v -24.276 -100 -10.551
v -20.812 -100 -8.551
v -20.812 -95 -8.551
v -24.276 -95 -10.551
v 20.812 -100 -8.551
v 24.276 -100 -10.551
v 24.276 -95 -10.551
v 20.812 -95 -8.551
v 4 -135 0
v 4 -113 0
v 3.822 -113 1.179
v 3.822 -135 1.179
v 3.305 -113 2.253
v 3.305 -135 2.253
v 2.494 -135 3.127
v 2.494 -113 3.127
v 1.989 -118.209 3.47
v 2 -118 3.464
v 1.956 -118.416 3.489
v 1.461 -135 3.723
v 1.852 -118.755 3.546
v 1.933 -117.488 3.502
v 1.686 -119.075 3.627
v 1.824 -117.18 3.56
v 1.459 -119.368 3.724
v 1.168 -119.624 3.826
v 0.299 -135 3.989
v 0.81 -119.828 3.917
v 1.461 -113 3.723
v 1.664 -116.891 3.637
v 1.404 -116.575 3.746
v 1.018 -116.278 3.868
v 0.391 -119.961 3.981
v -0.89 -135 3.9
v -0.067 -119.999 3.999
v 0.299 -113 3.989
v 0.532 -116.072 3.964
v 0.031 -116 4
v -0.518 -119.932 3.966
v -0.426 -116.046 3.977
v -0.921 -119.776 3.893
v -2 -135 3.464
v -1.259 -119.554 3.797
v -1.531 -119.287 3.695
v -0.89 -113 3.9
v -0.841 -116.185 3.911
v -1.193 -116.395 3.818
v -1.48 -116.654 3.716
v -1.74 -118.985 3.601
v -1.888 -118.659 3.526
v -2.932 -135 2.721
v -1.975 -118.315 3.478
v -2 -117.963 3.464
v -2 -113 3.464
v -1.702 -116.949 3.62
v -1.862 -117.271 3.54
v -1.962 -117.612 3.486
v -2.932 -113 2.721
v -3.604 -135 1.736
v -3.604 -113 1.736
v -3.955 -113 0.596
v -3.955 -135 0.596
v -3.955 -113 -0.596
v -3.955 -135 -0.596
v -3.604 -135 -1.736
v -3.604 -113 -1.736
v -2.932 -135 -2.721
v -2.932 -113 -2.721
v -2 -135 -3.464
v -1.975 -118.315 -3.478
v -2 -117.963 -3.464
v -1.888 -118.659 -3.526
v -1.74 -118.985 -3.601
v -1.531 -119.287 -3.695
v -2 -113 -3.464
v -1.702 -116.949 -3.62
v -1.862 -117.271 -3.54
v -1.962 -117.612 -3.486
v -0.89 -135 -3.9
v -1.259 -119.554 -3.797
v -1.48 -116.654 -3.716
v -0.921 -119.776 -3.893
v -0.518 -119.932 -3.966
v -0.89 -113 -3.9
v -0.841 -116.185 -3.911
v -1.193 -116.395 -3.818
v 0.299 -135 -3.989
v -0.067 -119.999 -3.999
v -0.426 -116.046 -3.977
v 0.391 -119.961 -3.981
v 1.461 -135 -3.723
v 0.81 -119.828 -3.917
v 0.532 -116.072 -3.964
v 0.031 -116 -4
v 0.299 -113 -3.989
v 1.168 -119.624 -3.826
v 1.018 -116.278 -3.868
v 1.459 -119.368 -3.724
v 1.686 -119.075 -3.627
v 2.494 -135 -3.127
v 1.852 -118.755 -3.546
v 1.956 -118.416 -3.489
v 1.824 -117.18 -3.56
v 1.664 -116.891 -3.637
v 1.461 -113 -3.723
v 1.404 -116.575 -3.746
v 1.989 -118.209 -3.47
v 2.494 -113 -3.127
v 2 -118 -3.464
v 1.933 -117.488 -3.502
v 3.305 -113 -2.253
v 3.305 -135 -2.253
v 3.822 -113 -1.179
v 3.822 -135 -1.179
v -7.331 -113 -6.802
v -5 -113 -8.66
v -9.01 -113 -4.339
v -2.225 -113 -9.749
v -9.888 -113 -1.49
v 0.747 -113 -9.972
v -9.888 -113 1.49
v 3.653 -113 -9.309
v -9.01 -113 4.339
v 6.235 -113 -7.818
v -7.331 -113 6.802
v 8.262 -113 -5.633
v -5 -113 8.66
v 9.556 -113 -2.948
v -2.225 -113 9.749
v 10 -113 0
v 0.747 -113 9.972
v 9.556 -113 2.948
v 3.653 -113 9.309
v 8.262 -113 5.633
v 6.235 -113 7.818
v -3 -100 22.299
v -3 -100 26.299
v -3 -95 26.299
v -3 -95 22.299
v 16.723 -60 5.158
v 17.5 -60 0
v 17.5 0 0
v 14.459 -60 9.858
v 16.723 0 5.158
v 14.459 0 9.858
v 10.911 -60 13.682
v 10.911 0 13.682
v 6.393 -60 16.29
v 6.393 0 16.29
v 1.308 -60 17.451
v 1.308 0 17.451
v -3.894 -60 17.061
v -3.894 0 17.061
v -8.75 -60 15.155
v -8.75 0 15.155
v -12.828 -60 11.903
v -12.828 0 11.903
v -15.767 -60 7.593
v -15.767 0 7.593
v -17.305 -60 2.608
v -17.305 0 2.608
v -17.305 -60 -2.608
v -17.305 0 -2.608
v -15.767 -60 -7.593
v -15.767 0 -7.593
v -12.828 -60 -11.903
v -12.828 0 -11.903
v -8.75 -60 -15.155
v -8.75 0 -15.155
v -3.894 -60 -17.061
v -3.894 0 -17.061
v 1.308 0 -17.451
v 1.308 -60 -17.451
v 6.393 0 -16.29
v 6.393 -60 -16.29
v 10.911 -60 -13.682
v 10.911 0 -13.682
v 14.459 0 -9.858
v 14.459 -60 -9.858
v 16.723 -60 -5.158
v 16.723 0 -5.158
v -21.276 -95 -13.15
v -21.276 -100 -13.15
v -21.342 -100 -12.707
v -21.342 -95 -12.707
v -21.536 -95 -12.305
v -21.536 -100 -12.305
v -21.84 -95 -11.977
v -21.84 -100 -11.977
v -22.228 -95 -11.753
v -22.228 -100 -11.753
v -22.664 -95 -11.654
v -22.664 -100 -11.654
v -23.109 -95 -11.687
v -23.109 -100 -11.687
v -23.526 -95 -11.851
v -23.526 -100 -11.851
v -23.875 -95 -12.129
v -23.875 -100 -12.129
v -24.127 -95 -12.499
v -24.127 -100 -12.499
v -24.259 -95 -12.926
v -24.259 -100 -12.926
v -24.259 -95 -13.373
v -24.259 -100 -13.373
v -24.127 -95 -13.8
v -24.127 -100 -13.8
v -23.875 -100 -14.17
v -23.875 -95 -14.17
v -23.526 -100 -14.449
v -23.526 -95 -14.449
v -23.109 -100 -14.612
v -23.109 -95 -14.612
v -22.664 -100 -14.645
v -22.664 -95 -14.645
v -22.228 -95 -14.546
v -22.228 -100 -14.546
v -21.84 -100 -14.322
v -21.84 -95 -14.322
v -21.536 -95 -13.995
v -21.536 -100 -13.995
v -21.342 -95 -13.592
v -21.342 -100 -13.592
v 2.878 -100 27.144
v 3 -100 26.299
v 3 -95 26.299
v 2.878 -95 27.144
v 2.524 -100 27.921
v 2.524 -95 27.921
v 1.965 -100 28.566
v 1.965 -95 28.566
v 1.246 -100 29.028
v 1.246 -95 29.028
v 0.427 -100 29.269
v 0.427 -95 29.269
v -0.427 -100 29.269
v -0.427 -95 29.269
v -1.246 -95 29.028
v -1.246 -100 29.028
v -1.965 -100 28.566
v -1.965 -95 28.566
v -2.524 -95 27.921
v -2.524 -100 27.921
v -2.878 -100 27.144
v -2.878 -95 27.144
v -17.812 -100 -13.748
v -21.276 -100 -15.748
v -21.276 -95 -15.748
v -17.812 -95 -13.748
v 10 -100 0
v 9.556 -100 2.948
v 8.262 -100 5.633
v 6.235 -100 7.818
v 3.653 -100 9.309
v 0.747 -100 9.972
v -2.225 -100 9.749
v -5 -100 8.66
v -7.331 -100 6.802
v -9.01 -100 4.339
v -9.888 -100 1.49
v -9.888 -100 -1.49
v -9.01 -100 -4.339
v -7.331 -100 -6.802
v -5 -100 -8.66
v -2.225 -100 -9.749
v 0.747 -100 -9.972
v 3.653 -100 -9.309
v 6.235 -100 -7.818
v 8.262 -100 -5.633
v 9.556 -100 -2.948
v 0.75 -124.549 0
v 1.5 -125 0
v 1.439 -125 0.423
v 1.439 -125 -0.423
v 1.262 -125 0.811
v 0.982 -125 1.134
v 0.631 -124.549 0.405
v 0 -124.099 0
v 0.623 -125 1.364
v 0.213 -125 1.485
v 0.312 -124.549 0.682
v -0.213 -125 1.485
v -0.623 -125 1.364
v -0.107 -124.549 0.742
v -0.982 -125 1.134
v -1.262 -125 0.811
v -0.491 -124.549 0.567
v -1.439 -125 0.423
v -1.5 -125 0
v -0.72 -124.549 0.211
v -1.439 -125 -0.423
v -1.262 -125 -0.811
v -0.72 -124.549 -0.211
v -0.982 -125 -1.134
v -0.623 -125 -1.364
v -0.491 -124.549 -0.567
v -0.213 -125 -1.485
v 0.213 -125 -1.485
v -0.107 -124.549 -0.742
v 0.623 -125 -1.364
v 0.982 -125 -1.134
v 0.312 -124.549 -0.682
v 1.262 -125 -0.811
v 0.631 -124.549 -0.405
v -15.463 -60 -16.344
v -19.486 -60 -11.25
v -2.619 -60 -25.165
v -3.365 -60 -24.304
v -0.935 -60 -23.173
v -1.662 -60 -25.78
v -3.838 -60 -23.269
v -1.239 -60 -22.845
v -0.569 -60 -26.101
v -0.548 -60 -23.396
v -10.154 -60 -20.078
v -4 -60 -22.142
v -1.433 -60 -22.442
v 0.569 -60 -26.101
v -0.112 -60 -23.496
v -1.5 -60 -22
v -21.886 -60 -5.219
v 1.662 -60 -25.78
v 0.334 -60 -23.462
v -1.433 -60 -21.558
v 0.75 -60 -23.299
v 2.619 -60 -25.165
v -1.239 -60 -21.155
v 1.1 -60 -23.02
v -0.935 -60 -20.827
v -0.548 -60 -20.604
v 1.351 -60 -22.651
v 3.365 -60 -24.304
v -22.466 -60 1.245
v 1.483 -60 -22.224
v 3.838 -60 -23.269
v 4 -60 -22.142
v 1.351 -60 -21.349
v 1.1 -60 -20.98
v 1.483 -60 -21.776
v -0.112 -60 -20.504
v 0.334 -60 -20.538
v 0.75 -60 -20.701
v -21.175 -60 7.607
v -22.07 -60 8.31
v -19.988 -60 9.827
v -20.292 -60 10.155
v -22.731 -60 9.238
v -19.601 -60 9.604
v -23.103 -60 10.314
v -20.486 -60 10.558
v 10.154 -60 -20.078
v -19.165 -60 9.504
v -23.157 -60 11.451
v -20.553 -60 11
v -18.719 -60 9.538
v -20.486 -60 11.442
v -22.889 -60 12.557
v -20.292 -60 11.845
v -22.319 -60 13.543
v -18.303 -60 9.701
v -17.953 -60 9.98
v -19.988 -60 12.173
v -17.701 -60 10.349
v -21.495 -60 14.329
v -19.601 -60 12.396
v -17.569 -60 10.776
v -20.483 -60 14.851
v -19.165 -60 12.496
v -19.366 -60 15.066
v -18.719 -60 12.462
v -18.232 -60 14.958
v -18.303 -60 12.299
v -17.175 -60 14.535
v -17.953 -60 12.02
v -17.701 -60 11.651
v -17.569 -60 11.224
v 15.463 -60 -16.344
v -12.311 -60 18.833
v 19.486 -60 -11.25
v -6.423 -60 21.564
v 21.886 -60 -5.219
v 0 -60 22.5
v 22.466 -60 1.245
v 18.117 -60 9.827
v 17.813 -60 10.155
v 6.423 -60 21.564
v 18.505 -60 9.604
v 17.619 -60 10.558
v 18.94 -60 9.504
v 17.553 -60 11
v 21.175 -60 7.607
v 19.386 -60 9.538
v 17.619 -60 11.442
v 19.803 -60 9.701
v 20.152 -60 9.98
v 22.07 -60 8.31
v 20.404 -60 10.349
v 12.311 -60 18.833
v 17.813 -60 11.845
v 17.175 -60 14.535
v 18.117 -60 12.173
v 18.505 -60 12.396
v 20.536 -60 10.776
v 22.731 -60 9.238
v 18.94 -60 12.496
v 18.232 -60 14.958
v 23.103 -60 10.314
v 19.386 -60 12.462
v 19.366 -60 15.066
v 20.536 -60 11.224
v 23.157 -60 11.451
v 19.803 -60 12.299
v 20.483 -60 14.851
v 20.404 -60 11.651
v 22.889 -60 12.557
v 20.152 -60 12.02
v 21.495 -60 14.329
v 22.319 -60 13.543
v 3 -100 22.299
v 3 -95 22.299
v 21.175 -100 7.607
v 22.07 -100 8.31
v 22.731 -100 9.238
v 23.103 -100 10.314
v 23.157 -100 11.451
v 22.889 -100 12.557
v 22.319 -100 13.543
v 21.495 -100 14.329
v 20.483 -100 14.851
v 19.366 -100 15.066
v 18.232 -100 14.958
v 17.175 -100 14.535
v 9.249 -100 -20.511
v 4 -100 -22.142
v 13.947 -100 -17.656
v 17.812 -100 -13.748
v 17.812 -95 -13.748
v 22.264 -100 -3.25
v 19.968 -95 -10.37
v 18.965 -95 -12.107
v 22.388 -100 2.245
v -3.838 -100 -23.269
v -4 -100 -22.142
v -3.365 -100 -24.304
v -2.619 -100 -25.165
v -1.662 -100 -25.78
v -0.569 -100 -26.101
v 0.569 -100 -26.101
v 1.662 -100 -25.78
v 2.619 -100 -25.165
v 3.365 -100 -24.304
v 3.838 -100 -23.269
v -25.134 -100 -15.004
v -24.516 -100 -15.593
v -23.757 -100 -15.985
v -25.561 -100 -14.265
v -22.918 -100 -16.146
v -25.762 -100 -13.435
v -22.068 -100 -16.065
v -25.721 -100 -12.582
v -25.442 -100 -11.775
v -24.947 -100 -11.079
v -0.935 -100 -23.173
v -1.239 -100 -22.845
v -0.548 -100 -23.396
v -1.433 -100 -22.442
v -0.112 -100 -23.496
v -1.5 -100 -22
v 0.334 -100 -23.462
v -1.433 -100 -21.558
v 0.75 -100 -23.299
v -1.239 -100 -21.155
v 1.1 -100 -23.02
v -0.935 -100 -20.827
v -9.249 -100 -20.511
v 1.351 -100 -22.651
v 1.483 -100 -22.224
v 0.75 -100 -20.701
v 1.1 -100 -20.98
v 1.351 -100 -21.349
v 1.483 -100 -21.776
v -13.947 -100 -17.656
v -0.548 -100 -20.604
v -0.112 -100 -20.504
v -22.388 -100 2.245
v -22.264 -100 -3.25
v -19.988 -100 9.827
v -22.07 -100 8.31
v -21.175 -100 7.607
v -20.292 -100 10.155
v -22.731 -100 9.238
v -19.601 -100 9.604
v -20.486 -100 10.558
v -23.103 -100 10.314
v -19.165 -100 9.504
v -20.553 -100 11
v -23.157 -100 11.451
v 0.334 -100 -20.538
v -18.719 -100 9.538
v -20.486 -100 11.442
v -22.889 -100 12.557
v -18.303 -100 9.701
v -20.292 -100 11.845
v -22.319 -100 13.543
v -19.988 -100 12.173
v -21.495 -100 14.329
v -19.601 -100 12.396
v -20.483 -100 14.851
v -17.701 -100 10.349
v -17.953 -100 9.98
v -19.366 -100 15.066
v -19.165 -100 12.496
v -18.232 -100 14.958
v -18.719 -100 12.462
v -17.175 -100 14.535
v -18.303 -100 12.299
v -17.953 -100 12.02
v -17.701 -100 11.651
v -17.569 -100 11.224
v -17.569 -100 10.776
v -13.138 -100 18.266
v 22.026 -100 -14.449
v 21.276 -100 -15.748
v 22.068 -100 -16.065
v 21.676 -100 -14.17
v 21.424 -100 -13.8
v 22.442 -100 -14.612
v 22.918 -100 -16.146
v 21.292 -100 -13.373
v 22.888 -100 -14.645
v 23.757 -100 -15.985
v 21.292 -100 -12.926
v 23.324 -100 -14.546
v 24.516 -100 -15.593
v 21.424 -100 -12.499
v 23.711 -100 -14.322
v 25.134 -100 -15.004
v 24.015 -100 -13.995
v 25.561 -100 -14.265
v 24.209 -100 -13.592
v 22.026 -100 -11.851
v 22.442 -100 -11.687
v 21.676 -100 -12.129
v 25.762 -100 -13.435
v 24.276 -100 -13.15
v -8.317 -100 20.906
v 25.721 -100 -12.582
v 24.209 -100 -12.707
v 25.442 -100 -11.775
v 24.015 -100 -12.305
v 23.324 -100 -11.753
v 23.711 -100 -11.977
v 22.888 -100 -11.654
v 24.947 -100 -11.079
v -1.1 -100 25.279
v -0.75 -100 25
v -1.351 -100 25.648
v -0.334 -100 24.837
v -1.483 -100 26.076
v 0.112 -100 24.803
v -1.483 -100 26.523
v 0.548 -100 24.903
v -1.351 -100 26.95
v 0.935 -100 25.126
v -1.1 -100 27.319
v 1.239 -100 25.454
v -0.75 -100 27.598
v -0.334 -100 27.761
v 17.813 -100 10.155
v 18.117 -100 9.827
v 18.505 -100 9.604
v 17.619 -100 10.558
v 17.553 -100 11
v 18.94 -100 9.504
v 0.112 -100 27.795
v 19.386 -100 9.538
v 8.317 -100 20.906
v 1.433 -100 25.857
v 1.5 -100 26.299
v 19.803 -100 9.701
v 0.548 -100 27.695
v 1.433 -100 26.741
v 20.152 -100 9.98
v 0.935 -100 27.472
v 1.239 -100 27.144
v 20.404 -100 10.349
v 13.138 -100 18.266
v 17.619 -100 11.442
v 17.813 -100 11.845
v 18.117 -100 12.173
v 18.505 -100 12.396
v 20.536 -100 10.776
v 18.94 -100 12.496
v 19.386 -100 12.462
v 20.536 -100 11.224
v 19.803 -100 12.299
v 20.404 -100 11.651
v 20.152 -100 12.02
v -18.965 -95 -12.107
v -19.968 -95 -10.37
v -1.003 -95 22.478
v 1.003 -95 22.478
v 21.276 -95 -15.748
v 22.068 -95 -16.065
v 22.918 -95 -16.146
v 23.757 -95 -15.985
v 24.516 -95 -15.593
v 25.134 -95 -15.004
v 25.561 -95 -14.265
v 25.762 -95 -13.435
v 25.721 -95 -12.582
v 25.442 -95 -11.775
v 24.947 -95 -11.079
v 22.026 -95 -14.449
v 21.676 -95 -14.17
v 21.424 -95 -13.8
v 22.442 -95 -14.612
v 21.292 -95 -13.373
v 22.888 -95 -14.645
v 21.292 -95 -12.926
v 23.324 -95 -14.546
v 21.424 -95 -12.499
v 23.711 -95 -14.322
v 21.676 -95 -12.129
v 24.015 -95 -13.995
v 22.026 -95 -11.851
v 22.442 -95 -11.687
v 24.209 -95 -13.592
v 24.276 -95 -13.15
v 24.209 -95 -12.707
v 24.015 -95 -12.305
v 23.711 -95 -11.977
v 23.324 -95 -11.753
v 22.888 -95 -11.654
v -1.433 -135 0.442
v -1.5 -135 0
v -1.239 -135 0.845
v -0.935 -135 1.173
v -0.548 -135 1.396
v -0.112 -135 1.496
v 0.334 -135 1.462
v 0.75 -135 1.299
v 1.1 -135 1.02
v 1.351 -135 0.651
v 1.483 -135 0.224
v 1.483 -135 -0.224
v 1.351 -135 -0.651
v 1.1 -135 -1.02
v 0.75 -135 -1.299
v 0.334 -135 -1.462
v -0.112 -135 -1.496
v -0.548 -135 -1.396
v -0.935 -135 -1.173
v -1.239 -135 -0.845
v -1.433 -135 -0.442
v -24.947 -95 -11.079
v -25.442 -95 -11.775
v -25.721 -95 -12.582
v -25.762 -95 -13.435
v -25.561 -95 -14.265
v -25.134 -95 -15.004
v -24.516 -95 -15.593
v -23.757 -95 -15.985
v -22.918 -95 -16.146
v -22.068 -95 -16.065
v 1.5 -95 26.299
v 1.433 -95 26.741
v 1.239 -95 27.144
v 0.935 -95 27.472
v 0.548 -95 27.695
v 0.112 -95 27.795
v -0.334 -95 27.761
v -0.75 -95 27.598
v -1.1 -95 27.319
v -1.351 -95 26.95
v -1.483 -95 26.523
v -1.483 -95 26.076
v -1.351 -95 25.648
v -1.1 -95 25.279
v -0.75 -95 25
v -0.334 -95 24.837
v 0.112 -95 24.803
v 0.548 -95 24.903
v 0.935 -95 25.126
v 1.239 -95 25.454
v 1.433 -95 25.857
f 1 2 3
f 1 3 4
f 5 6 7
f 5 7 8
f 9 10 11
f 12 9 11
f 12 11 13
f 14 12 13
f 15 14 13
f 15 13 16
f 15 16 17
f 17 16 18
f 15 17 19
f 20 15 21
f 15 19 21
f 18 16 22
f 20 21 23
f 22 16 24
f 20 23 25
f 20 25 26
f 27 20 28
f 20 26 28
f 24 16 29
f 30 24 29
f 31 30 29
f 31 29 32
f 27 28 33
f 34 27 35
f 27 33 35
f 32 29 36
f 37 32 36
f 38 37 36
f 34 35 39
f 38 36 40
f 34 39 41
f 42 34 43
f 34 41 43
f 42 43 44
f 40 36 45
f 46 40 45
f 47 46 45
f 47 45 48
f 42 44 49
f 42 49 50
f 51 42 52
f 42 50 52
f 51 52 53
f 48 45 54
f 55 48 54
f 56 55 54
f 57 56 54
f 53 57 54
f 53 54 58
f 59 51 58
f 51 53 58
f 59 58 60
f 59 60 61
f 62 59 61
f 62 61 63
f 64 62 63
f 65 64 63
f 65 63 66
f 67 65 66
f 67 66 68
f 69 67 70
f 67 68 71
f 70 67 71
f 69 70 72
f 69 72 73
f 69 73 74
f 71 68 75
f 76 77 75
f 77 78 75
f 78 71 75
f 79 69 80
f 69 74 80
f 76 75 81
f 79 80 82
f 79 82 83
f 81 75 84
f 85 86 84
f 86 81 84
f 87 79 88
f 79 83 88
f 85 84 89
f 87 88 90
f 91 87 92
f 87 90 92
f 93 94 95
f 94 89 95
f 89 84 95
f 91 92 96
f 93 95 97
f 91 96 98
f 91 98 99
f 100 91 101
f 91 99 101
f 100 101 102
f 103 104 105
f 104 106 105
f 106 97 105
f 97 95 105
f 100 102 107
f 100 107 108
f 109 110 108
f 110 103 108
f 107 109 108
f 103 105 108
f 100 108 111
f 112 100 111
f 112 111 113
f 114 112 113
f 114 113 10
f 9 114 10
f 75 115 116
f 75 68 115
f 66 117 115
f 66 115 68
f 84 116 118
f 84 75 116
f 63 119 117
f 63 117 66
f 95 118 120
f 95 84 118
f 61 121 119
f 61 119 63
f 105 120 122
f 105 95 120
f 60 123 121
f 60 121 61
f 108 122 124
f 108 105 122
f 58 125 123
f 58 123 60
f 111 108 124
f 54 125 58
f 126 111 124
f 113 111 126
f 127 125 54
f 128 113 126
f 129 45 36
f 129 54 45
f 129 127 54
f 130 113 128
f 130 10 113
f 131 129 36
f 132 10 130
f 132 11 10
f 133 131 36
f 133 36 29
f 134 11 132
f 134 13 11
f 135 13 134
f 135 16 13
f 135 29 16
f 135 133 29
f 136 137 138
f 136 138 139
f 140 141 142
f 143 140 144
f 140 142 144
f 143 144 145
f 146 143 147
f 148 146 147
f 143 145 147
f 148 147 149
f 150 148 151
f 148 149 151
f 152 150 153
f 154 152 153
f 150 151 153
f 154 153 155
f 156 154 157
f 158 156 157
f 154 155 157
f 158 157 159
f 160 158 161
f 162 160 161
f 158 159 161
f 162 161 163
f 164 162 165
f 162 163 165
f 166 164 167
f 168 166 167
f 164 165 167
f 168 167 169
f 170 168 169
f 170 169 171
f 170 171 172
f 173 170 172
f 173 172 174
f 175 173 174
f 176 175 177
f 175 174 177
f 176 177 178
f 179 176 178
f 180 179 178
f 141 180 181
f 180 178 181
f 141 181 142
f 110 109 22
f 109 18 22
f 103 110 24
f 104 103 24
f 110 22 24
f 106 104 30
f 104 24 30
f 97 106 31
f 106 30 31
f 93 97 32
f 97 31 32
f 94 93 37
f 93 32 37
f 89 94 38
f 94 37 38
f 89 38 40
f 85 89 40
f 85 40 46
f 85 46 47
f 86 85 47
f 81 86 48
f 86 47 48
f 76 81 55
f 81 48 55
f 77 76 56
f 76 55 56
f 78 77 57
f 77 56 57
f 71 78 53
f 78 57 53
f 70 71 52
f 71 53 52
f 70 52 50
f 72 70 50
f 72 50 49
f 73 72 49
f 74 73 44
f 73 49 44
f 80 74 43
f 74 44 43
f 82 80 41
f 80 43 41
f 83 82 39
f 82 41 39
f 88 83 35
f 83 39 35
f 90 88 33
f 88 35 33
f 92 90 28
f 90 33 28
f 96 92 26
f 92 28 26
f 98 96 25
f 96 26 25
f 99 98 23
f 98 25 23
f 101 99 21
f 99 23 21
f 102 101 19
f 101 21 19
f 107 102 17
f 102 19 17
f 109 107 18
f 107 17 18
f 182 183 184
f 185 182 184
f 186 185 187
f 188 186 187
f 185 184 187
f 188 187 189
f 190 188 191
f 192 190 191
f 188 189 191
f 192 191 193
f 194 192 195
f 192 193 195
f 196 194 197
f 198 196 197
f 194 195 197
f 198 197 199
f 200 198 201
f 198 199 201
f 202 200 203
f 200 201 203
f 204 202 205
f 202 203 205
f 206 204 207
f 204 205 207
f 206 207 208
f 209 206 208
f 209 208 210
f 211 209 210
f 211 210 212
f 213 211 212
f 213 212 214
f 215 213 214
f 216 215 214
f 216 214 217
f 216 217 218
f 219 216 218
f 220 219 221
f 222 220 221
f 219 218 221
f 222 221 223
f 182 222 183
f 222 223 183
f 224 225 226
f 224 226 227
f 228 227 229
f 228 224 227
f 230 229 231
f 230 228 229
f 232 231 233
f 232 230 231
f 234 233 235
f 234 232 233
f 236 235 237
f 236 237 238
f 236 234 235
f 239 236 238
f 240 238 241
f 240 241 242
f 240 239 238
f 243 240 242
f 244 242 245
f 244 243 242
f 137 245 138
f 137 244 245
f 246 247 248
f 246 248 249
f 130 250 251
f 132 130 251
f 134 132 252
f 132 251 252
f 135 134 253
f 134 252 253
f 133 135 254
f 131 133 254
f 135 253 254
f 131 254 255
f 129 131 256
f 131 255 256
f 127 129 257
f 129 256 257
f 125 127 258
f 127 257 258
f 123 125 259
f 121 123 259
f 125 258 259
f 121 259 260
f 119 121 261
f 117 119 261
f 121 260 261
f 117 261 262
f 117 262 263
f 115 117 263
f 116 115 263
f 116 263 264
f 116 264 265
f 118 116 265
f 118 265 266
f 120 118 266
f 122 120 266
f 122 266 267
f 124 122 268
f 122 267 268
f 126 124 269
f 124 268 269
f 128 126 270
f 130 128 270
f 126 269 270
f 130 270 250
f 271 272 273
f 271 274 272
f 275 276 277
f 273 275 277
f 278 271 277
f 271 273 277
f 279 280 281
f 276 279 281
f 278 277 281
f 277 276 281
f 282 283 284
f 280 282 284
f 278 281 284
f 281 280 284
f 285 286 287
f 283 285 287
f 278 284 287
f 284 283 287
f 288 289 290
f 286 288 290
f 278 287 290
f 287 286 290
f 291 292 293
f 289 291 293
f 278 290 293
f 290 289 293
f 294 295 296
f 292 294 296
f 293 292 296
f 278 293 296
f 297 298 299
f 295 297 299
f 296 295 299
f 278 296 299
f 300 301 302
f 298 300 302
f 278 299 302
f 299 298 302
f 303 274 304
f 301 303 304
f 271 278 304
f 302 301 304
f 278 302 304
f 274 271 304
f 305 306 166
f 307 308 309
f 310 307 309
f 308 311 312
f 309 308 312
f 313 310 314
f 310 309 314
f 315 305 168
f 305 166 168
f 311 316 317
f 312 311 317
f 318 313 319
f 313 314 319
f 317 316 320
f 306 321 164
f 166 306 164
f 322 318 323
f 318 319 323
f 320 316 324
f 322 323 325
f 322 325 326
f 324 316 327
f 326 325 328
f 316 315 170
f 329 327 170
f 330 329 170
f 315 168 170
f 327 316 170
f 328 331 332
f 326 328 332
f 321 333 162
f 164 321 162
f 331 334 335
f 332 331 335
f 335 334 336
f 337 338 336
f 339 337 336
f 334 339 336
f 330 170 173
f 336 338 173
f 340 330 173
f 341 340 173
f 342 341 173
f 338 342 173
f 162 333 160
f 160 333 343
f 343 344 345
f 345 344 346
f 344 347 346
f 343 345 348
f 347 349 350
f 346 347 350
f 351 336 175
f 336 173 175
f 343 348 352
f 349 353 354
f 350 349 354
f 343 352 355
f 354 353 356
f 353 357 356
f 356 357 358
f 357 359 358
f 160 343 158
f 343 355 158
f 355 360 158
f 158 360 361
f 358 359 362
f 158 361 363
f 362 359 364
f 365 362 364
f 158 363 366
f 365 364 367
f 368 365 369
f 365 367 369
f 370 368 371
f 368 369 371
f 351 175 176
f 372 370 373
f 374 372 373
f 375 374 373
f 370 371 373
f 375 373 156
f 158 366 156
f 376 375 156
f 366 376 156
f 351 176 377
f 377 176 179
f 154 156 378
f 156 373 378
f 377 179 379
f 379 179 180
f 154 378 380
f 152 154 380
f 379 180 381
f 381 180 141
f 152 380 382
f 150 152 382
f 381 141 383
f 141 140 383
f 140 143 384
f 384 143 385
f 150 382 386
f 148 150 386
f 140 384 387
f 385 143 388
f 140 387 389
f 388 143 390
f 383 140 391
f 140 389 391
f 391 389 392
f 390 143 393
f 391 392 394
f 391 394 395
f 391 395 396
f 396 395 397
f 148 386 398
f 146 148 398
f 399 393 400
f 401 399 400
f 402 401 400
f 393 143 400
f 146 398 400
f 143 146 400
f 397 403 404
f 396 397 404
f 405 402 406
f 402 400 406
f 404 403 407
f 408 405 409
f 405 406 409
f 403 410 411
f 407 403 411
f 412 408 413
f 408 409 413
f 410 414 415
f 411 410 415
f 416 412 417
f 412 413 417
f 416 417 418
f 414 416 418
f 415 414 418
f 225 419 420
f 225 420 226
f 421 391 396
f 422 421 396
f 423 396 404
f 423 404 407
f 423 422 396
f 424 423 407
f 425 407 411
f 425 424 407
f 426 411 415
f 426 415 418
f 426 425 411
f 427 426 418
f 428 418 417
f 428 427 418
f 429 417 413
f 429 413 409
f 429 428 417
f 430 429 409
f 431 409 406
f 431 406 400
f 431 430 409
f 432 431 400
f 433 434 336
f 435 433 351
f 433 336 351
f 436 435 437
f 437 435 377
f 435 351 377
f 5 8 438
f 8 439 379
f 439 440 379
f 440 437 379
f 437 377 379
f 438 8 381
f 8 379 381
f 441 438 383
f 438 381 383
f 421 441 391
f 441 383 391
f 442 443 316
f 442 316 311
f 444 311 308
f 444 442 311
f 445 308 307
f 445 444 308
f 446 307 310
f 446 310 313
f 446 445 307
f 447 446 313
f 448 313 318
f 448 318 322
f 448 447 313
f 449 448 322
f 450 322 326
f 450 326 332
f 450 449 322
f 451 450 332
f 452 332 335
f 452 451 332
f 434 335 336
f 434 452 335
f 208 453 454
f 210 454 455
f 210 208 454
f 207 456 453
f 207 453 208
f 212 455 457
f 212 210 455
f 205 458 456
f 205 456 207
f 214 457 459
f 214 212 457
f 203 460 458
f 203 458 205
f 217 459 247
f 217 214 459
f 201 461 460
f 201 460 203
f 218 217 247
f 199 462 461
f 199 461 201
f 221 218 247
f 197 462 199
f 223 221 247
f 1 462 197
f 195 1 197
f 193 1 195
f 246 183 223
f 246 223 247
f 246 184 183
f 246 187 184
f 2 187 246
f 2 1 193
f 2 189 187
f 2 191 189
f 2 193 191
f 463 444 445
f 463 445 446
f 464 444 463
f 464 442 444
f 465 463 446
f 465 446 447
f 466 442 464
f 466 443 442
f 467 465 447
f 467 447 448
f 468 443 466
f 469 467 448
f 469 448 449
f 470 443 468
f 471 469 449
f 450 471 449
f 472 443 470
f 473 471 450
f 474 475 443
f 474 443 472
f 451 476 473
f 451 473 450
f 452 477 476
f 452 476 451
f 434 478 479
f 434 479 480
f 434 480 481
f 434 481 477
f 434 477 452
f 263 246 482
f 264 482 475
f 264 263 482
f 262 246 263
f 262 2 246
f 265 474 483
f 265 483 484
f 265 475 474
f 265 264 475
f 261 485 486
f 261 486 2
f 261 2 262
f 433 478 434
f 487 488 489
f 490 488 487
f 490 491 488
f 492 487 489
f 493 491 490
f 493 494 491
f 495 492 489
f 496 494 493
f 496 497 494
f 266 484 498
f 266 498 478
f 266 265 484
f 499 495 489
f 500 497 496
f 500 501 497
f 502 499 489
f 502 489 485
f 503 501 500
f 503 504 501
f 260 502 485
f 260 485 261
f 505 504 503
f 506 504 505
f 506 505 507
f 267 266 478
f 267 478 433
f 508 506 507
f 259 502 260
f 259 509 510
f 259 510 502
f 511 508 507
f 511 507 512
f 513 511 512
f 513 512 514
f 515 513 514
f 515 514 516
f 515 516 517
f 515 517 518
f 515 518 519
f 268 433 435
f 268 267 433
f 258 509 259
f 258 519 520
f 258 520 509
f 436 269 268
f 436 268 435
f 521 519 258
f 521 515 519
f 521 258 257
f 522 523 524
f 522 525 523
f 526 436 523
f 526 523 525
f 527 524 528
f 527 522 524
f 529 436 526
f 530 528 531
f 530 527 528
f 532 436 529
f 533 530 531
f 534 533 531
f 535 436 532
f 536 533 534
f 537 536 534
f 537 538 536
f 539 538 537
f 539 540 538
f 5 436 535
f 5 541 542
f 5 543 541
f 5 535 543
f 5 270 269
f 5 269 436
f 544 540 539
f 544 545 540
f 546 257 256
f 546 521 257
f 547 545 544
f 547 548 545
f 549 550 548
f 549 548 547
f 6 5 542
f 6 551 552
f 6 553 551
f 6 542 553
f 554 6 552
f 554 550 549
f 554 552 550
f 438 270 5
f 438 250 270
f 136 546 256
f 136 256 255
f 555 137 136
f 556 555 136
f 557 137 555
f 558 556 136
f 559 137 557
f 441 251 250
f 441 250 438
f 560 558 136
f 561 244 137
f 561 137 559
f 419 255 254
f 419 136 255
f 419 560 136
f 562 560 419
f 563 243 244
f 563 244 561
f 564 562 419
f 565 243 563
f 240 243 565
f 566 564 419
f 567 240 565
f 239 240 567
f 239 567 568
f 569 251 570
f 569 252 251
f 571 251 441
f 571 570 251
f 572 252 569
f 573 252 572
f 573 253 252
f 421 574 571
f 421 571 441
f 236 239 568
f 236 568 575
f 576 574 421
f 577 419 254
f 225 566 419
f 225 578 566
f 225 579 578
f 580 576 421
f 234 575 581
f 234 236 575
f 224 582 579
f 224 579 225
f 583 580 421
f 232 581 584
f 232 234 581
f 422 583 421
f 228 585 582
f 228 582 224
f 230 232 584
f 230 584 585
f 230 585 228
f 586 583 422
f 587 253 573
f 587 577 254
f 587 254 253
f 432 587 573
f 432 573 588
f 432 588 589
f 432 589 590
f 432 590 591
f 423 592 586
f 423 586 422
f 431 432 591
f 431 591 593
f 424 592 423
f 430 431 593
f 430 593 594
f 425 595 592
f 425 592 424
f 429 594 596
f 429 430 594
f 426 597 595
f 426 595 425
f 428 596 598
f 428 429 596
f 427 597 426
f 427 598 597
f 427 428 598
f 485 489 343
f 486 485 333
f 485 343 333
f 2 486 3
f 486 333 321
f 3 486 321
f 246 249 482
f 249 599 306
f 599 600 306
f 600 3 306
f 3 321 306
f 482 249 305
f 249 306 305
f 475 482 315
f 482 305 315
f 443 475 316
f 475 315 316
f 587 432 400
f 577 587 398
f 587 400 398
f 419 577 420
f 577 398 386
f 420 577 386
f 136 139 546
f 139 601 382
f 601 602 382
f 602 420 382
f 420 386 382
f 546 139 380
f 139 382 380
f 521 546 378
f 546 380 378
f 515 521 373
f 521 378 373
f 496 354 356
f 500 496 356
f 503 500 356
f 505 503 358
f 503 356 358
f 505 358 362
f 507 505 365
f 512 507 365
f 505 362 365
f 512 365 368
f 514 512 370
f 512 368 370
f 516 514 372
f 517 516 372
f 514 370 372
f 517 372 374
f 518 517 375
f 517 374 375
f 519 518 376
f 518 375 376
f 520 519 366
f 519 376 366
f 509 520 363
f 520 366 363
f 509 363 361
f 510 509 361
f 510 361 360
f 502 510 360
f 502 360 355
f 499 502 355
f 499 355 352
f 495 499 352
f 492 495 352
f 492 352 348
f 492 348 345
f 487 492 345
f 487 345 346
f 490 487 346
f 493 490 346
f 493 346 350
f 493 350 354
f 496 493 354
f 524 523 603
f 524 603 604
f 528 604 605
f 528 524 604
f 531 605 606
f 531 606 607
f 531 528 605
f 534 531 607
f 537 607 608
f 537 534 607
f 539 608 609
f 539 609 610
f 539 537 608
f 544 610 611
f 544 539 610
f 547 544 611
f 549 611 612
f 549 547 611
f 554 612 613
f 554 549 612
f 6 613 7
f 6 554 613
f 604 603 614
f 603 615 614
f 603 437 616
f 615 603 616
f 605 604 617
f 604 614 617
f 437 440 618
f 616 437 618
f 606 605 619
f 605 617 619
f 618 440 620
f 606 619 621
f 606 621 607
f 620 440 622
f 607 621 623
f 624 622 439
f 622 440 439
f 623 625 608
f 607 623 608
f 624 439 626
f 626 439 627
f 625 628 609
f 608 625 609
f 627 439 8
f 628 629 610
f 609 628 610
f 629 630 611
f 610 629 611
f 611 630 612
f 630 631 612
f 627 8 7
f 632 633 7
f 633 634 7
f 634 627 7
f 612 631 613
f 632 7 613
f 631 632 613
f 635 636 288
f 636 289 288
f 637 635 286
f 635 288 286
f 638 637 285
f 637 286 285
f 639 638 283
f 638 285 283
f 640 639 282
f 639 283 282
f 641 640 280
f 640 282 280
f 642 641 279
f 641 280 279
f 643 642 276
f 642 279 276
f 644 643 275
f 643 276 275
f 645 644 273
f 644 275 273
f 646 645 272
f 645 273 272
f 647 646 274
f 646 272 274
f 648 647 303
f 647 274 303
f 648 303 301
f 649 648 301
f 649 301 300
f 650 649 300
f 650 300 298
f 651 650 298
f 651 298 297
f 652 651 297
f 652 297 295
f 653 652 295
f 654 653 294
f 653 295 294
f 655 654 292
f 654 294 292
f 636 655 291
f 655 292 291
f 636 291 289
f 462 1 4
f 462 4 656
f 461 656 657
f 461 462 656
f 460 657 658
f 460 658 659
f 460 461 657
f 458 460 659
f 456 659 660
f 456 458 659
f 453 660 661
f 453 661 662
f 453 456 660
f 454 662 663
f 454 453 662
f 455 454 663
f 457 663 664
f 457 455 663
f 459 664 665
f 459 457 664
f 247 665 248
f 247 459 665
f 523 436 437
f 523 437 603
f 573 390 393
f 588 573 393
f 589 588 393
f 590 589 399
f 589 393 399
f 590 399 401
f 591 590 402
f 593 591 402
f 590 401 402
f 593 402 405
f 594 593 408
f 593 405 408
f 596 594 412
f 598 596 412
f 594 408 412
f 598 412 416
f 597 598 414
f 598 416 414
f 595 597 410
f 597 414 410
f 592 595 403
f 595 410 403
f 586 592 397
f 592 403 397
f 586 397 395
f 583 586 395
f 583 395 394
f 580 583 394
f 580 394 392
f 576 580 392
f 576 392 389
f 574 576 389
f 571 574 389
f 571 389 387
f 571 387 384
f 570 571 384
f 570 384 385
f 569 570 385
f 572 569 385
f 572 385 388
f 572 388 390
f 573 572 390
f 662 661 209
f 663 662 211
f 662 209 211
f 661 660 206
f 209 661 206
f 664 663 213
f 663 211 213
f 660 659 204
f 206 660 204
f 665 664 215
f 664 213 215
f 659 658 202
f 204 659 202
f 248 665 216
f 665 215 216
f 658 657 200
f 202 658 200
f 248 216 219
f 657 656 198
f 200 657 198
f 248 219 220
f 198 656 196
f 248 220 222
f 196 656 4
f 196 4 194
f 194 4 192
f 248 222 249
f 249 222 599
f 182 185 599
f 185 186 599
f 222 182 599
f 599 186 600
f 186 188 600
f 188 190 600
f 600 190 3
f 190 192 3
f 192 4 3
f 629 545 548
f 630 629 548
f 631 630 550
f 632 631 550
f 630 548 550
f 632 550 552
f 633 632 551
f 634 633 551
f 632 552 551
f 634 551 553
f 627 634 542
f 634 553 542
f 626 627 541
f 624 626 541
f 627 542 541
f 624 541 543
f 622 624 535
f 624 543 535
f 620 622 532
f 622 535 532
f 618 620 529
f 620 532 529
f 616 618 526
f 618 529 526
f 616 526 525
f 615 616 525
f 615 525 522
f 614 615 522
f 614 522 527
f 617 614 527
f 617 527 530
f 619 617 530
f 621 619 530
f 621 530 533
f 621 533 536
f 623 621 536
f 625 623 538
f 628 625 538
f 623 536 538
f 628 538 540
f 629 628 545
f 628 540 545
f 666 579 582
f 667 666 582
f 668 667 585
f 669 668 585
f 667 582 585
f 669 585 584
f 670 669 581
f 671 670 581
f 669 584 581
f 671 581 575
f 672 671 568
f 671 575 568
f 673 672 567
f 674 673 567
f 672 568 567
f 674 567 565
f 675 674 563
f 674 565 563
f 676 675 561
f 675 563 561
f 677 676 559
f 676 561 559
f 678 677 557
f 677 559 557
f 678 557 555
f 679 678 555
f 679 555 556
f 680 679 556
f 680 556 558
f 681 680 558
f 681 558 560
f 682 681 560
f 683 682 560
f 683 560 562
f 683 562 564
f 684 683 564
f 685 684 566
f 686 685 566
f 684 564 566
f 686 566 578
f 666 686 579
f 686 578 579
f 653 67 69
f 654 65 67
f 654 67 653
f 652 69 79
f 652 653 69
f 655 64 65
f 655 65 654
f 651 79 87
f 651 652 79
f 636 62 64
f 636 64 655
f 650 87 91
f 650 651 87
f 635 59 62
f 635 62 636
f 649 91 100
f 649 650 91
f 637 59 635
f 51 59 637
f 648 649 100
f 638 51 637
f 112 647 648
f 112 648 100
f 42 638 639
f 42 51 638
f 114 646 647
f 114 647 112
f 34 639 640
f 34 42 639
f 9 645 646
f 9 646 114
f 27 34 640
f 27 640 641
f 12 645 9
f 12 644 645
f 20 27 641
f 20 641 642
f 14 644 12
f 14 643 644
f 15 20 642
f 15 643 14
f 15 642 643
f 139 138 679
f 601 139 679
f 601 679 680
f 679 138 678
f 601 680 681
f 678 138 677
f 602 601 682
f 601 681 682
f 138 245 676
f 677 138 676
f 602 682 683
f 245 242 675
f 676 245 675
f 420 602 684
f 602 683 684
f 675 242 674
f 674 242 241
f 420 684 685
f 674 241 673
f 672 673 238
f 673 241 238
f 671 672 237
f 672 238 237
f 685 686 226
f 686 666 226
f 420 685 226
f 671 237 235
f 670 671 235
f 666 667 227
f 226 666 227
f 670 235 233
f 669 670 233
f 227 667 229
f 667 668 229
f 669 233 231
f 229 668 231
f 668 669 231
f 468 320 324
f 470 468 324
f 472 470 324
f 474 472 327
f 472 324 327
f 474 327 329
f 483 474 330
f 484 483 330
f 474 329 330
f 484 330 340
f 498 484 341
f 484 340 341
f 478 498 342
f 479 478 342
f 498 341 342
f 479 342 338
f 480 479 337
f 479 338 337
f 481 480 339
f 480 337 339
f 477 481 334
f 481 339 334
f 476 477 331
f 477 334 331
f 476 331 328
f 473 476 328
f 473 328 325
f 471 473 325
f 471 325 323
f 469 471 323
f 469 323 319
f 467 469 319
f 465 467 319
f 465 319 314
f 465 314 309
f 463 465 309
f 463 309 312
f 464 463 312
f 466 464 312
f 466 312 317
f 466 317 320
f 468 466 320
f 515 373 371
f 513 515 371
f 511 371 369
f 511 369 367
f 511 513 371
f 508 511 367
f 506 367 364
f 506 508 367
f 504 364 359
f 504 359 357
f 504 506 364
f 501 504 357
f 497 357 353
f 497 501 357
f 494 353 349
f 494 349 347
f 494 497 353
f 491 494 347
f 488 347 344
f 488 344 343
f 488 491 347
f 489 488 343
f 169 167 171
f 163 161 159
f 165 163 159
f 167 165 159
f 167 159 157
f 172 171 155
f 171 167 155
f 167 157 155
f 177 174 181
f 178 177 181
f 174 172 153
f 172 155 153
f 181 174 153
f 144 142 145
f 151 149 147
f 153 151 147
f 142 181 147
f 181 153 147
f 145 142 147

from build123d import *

# Parameters (mm, degrees)
F0_R      = 17.5
F1_DEPTH  = 60
F2_R      = 22.5
F3_DEPTH  = 40
F5_DEPTH  = 40
F7_D      = 3
F8_R      = 1.5
F9_DEPTH  = 5
F10_R     = 10
F11_DEPTH = 13
F12_R     = 4
F13_DEPTH = 22
F15_D     = 3
F15_DEPTH = 10
F15_TIP   = 0.9012909285
F16_R     = 2
F17_DEPTH = 12.5


with BuildPart() as f1:
    # F0 (on Front) → F1 (new body)
    with BuildSketch(Plane.XZ):
        Circle(F0_R)
    extrude(amount=F1_DEPTH)

    # F2 (on face) → F3 (join)
    with BuildSketch(Plane.XZ.offset(60)):
        Circle(F2_R)
    extrude(amount=F3_DEPTH)

    # F4 (on face) → F5 (join)
    with BuildSketch(Plane.XZ.offset(100)):
        with BuildLine():
            Line((4, -22.1415898255), (-4, -22.1415898255))
            ThreePointArc((-4, -22.1415898255), (0, -26.1415898255), (4, -22.1415898255))
        make_face()
        with BuildLine():
            Line((17.175179269, 14.5348965279), (21.175179269, 7.6066932976))
            ThreePointArc((21.175179269, 7.6066932976), (22.6392808842, 13.0707949127), (17.175179269, 14.5348965279))
        make_face()
        with BuildLine():
            Line((-21.175179269, 7.6066932976), (-17.175179269, 14.5348965279))
            ThreePointArc((-17.175179269, 14.5348965279), (-22.6392808842, 13.0707949127), (-21.175179269, 7.6066932976))
        make_face()
    extrude(amount=-F5_DEPTH)

    # F7 (through all)
    with Locations(Plane.XZ.offset(100)):
        with Locations((-19.0525588833, 11), (0, -22), (19.0525588833, 11)):
            Hole(F7_D / 2)

    # F8 (on face) → F9 (join)
    with BuildSketch(Plane.XZ.offset(100)):
        with BuildLine():
            Line((-3, 26.299103121), (-3, 22.299103121))
            Line((-3, 22.299103121), (3, 22.299103121))
            Line((3, 22.299103121), (3, 26.299103121))
            ThreePointArc((3, 26.299103121), (0, 29.299103121), (-3, 26.299103121))
        make_face()
        with Locations((0, 26.299103121)):
            Circle(F8_R, mode=Mode.SUBTRACT)
        with BuildLine():
            Line((-20.8115897844, -8.5514753491), (-24.2756913995, -10.5514753491))
            ThreePointArc((-24.2756913995, -10.5514753491), (-25.3737676109, -14.6495515605), (-21.2756913995, -15.7476277718))
            Line((-21.2756913995, -15.7476277718), (-17.8115897844, -13.7476277718))
            Line((-17.8115897844, -13.7476277718), (-20.8115897844, -8.5514753491))
        make_face()
        with Locations((-22.7756913995, -13.1495515605)):
            Circle(F8_R, mode=Mode.SUBTRACT)
        with BuildLine():
            Line((17.8115897844, -13.7476277718), (21.2756913995, -15.7476277718))
            ThreePointArc((21.2756913995, -15.7476277718), (25.3737676109, -14.6495515605), (24.2756913995, -10.5514753491))
            Line((24.2756913995, -10.5514753491), (20.8115897844, -8.5514753491))
            Line((20.8115897844, -8.5514753491), (17.8115897844, -13.7476277718))
        make_face()
        with Locations((22.7756913995, -13.1495515605)):
            Circle(F8_R, mode=Mode.SUBTRACT)
    extrude(amount=-F9_DEPTH)

    # F10 (on face) → F11 (join)
    with BuildSketch(Plane.XZ.offset(100)):
        Circle(F10_R)
    extrude(amount=F11_DEPTH)

    # F12 (on face) → F13 (join)
    with BuildSketch(Plane.XZ.offset(113)):
        Circle(F12_R)
    extrude(amount=F13_DEPTH)

    # F15
    with Locations(Plane.XZ.offset(135)):
        with Locations((0, 0)):
            Hole(F15_D / 2, depth=F15_DEPTH)
            with Locations((0, 0, -(F15_DEPTH + F15_TIP / 2))):  # 118° drill point
                Cone(0, F15_D / 2, F15_TIP, mode=Mode.SUBTRACT)

    # F16 (on Top) → F17 (cut, symmetric)
    with BuildSketch(Plane.XY):
        with Locations((0, -118)):
            Circle(F16_R)
    extrude(amount=F17_DEPTH, both=True, mode=Mode.SUBTRACT)


solid = f1.part
